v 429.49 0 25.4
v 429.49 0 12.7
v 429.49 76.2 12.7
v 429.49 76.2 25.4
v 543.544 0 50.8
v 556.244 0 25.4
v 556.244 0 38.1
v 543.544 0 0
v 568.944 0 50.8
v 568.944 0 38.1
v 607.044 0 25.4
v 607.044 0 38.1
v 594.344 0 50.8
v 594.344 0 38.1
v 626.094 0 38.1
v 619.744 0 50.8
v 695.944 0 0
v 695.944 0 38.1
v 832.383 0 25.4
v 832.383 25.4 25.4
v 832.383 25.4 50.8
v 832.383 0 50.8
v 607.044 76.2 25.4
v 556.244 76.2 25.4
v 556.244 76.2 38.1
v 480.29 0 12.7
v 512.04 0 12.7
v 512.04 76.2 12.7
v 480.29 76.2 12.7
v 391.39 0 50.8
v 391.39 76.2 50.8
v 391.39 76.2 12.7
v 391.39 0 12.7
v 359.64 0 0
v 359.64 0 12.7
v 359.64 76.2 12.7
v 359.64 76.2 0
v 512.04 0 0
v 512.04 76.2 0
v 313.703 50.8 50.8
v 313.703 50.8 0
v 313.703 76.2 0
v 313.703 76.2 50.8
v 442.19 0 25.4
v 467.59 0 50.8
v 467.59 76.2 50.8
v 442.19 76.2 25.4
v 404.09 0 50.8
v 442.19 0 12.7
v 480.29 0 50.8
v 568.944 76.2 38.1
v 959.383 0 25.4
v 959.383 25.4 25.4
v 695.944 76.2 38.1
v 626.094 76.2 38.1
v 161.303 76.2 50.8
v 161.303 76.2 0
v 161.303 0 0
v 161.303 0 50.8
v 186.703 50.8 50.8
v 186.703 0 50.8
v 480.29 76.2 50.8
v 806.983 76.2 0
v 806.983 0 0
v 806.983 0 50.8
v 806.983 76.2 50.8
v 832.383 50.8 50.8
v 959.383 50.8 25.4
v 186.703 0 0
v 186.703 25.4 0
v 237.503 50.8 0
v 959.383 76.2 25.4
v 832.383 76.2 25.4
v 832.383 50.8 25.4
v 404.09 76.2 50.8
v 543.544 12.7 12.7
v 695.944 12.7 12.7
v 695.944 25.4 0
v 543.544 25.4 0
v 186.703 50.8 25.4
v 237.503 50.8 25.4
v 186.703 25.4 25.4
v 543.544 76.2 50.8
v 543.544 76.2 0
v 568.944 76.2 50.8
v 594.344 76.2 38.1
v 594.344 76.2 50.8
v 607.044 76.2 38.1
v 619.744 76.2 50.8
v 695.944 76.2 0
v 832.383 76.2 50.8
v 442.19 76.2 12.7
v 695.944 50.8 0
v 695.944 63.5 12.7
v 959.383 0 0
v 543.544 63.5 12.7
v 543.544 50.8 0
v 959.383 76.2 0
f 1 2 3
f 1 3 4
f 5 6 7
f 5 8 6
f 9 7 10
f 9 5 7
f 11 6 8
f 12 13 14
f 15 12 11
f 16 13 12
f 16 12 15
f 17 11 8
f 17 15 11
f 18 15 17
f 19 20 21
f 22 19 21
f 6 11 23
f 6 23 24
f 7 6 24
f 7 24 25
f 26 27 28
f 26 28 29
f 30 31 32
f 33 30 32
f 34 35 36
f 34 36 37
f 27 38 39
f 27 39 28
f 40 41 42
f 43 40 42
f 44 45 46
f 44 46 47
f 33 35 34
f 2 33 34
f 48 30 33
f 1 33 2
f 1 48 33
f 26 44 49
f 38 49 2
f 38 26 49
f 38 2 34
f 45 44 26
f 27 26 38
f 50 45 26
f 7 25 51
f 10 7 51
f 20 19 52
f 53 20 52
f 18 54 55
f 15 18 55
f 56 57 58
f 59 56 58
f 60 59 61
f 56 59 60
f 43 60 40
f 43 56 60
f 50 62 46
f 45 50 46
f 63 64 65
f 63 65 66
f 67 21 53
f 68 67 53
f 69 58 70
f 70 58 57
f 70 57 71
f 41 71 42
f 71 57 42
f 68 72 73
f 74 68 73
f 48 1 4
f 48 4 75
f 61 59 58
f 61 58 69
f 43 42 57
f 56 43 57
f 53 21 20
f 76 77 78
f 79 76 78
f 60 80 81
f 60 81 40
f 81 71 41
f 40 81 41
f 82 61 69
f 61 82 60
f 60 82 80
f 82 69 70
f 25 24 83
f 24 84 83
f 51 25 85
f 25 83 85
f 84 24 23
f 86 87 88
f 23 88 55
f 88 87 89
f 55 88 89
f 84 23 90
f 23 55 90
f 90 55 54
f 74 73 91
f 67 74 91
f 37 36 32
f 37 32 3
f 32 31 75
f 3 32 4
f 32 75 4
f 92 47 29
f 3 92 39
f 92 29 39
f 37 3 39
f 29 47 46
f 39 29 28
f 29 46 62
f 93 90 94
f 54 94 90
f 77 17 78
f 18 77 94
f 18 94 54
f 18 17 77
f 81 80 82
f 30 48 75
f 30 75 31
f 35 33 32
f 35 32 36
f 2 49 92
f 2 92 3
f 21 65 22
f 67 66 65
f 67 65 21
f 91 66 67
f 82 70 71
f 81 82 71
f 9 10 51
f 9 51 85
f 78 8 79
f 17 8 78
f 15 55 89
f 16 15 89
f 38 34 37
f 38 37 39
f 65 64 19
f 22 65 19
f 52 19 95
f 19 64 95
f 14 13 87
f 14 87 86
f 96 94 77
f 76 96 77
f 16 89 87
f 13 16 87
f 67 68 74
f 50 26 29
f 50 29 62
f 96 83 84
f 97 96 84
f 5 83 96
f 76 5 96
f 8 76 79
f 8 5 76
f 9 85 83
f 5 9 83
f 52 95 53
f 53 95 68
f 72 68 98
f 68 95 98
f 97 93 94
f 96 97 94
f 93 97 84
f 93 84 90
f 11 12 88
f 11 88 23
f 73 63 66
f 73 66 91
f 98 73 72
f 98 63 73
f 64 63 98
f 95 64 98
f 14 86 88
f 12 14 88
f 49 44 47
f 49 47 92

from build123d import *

# Parameters (mm, degrees)
F1_DEPTH  = 50.8
F3_DEPTH  = 25.4
F5_DEPTH  = 76.2
F7_DEPTH  = 76.2
F9_DEPTH  = 167.386
F10_W     = 152.4
F10_H     = 76.2
F11_DEPTH = 50.8
F12_W     = 127
F12_H     = 25.4
F13_DEPTH = 25.4
F14_W     = 127
F14_H     = 25.4
F15_DEPTH = 25.4
F17_DEPTH = 25.4


with BuildPart() as f1:
    # F0 (on Top) → F1 (new body)
    with BuildSketch(Plane.XY):
        Polygon((161.302644, 76.2), (161.302644, 0), (186.702644, 0), (186.702644, 25.4), (237.502644, 50.8), (313.702644, 50.8), (313.702644, 76.2), align=None)
    extrude(amount=F1_DEPTH)

    # F2 (on face) → F3 (cut)
    with BuildSketch(Plane.XY.offset(50.8)):
        Polygon((186.702644, 50.8), (186.702644, 25.4), (237.502644, 50.8), align=None)
    extrude(amount=-F3_DEPTH, mode=Mode.SUBTRACT)


with BuildPart() as f5:
    # F4 (on Front) → F5 (new body)
    with BuildSketch(Plane.XZ):
        Polygon((359.640496, 12.7), (359.640496, 0), (512.040496, 0), (512.040496, 12.7), (480.290496, 12.7), (480.290496, 50.8), (467.590496, 50.8), (442.190496, 25.4), (442.190496, 12.7), (429.490496, 12.7), (429.490496, 25.4), (404.090496, 50.8), (391.390496, 50.8), (391.390496, 12.7), align=None)
    extrude(amount=-F5_DEPTH)


with BuildPart() as f7:
    # F6 (on Front) → F7 (new body)
    with BuildSketch(Plane.XZ):
        Polygon((543.544258, 50.8), (543.544258, 0), (695.944258, 0), (695.944258, 38.1), (626.094258, 38.1), (619.744258, 50.8), (594.344258, 50.8), (594.344258, 38.1), (607.044258, 38.1), (607.044258, 25.4), (556.244258, 25.4), (556.244258, 38.1), (568.944258, 38.1), (568.944258, 50.8), align=None)
    extrude(amount=-F7_DEPTH)

    # F8 (on face) → F9 (cut)
    with BuildSketch(Plane.YZ.offset(695.944258)):
        Polygon((63.5, 12.7), (12.7, 12.7), (25.4, 0), (50.8, 0), align=None)
    extrude(amount=-F9_DEPTH, mode=Mode.SUBTRACT)


with BuildPart() as f11:
    # F10 (on Top) → F11 (new body)
    with BuildSketch(Plane.XY):
        with Locations((883.183289, 38.1)):
            Rectangle(F10_W, F10_H)
    extrude(amount=F11_DEPTH)

    # F12 (on face) → F13 (cut)
    with BuildSketch(Plane.XZ):
        with Locations((895.883289, 38.1)):
            Rectangle(F12_W, F12_H)
    extrude(amount=-F13_DEPTH, mode=Mode.SUBTRACT)

    # F14 (on face) → F15 (cut)
    with BuildSketch(Plane(origin=(0, 76.2, 0), x_dir=(-1, 0, 0), z_dir=(0, 1, 0))):
        with Locations((-895.883289, 38.1)):
            Rectangle(F14_W, F14_H)
    extrude(amount=-F15_DEPTH, mode=Mode.SUBTRACT)

    # F16 (on face) → F17 (cut)
    with BuildSketch(Plane.XZ.offset(-25.4)):
        Polygon((959.383289, 50.8), (832.383289, 50.8), (959.383289, 25.4), align=None)
    extrude(amount=-F17_DEPTH, mode=Mode.SUBTRACT)


solid = Compound([f1.part, f5.part, f7.part, f11.part])
